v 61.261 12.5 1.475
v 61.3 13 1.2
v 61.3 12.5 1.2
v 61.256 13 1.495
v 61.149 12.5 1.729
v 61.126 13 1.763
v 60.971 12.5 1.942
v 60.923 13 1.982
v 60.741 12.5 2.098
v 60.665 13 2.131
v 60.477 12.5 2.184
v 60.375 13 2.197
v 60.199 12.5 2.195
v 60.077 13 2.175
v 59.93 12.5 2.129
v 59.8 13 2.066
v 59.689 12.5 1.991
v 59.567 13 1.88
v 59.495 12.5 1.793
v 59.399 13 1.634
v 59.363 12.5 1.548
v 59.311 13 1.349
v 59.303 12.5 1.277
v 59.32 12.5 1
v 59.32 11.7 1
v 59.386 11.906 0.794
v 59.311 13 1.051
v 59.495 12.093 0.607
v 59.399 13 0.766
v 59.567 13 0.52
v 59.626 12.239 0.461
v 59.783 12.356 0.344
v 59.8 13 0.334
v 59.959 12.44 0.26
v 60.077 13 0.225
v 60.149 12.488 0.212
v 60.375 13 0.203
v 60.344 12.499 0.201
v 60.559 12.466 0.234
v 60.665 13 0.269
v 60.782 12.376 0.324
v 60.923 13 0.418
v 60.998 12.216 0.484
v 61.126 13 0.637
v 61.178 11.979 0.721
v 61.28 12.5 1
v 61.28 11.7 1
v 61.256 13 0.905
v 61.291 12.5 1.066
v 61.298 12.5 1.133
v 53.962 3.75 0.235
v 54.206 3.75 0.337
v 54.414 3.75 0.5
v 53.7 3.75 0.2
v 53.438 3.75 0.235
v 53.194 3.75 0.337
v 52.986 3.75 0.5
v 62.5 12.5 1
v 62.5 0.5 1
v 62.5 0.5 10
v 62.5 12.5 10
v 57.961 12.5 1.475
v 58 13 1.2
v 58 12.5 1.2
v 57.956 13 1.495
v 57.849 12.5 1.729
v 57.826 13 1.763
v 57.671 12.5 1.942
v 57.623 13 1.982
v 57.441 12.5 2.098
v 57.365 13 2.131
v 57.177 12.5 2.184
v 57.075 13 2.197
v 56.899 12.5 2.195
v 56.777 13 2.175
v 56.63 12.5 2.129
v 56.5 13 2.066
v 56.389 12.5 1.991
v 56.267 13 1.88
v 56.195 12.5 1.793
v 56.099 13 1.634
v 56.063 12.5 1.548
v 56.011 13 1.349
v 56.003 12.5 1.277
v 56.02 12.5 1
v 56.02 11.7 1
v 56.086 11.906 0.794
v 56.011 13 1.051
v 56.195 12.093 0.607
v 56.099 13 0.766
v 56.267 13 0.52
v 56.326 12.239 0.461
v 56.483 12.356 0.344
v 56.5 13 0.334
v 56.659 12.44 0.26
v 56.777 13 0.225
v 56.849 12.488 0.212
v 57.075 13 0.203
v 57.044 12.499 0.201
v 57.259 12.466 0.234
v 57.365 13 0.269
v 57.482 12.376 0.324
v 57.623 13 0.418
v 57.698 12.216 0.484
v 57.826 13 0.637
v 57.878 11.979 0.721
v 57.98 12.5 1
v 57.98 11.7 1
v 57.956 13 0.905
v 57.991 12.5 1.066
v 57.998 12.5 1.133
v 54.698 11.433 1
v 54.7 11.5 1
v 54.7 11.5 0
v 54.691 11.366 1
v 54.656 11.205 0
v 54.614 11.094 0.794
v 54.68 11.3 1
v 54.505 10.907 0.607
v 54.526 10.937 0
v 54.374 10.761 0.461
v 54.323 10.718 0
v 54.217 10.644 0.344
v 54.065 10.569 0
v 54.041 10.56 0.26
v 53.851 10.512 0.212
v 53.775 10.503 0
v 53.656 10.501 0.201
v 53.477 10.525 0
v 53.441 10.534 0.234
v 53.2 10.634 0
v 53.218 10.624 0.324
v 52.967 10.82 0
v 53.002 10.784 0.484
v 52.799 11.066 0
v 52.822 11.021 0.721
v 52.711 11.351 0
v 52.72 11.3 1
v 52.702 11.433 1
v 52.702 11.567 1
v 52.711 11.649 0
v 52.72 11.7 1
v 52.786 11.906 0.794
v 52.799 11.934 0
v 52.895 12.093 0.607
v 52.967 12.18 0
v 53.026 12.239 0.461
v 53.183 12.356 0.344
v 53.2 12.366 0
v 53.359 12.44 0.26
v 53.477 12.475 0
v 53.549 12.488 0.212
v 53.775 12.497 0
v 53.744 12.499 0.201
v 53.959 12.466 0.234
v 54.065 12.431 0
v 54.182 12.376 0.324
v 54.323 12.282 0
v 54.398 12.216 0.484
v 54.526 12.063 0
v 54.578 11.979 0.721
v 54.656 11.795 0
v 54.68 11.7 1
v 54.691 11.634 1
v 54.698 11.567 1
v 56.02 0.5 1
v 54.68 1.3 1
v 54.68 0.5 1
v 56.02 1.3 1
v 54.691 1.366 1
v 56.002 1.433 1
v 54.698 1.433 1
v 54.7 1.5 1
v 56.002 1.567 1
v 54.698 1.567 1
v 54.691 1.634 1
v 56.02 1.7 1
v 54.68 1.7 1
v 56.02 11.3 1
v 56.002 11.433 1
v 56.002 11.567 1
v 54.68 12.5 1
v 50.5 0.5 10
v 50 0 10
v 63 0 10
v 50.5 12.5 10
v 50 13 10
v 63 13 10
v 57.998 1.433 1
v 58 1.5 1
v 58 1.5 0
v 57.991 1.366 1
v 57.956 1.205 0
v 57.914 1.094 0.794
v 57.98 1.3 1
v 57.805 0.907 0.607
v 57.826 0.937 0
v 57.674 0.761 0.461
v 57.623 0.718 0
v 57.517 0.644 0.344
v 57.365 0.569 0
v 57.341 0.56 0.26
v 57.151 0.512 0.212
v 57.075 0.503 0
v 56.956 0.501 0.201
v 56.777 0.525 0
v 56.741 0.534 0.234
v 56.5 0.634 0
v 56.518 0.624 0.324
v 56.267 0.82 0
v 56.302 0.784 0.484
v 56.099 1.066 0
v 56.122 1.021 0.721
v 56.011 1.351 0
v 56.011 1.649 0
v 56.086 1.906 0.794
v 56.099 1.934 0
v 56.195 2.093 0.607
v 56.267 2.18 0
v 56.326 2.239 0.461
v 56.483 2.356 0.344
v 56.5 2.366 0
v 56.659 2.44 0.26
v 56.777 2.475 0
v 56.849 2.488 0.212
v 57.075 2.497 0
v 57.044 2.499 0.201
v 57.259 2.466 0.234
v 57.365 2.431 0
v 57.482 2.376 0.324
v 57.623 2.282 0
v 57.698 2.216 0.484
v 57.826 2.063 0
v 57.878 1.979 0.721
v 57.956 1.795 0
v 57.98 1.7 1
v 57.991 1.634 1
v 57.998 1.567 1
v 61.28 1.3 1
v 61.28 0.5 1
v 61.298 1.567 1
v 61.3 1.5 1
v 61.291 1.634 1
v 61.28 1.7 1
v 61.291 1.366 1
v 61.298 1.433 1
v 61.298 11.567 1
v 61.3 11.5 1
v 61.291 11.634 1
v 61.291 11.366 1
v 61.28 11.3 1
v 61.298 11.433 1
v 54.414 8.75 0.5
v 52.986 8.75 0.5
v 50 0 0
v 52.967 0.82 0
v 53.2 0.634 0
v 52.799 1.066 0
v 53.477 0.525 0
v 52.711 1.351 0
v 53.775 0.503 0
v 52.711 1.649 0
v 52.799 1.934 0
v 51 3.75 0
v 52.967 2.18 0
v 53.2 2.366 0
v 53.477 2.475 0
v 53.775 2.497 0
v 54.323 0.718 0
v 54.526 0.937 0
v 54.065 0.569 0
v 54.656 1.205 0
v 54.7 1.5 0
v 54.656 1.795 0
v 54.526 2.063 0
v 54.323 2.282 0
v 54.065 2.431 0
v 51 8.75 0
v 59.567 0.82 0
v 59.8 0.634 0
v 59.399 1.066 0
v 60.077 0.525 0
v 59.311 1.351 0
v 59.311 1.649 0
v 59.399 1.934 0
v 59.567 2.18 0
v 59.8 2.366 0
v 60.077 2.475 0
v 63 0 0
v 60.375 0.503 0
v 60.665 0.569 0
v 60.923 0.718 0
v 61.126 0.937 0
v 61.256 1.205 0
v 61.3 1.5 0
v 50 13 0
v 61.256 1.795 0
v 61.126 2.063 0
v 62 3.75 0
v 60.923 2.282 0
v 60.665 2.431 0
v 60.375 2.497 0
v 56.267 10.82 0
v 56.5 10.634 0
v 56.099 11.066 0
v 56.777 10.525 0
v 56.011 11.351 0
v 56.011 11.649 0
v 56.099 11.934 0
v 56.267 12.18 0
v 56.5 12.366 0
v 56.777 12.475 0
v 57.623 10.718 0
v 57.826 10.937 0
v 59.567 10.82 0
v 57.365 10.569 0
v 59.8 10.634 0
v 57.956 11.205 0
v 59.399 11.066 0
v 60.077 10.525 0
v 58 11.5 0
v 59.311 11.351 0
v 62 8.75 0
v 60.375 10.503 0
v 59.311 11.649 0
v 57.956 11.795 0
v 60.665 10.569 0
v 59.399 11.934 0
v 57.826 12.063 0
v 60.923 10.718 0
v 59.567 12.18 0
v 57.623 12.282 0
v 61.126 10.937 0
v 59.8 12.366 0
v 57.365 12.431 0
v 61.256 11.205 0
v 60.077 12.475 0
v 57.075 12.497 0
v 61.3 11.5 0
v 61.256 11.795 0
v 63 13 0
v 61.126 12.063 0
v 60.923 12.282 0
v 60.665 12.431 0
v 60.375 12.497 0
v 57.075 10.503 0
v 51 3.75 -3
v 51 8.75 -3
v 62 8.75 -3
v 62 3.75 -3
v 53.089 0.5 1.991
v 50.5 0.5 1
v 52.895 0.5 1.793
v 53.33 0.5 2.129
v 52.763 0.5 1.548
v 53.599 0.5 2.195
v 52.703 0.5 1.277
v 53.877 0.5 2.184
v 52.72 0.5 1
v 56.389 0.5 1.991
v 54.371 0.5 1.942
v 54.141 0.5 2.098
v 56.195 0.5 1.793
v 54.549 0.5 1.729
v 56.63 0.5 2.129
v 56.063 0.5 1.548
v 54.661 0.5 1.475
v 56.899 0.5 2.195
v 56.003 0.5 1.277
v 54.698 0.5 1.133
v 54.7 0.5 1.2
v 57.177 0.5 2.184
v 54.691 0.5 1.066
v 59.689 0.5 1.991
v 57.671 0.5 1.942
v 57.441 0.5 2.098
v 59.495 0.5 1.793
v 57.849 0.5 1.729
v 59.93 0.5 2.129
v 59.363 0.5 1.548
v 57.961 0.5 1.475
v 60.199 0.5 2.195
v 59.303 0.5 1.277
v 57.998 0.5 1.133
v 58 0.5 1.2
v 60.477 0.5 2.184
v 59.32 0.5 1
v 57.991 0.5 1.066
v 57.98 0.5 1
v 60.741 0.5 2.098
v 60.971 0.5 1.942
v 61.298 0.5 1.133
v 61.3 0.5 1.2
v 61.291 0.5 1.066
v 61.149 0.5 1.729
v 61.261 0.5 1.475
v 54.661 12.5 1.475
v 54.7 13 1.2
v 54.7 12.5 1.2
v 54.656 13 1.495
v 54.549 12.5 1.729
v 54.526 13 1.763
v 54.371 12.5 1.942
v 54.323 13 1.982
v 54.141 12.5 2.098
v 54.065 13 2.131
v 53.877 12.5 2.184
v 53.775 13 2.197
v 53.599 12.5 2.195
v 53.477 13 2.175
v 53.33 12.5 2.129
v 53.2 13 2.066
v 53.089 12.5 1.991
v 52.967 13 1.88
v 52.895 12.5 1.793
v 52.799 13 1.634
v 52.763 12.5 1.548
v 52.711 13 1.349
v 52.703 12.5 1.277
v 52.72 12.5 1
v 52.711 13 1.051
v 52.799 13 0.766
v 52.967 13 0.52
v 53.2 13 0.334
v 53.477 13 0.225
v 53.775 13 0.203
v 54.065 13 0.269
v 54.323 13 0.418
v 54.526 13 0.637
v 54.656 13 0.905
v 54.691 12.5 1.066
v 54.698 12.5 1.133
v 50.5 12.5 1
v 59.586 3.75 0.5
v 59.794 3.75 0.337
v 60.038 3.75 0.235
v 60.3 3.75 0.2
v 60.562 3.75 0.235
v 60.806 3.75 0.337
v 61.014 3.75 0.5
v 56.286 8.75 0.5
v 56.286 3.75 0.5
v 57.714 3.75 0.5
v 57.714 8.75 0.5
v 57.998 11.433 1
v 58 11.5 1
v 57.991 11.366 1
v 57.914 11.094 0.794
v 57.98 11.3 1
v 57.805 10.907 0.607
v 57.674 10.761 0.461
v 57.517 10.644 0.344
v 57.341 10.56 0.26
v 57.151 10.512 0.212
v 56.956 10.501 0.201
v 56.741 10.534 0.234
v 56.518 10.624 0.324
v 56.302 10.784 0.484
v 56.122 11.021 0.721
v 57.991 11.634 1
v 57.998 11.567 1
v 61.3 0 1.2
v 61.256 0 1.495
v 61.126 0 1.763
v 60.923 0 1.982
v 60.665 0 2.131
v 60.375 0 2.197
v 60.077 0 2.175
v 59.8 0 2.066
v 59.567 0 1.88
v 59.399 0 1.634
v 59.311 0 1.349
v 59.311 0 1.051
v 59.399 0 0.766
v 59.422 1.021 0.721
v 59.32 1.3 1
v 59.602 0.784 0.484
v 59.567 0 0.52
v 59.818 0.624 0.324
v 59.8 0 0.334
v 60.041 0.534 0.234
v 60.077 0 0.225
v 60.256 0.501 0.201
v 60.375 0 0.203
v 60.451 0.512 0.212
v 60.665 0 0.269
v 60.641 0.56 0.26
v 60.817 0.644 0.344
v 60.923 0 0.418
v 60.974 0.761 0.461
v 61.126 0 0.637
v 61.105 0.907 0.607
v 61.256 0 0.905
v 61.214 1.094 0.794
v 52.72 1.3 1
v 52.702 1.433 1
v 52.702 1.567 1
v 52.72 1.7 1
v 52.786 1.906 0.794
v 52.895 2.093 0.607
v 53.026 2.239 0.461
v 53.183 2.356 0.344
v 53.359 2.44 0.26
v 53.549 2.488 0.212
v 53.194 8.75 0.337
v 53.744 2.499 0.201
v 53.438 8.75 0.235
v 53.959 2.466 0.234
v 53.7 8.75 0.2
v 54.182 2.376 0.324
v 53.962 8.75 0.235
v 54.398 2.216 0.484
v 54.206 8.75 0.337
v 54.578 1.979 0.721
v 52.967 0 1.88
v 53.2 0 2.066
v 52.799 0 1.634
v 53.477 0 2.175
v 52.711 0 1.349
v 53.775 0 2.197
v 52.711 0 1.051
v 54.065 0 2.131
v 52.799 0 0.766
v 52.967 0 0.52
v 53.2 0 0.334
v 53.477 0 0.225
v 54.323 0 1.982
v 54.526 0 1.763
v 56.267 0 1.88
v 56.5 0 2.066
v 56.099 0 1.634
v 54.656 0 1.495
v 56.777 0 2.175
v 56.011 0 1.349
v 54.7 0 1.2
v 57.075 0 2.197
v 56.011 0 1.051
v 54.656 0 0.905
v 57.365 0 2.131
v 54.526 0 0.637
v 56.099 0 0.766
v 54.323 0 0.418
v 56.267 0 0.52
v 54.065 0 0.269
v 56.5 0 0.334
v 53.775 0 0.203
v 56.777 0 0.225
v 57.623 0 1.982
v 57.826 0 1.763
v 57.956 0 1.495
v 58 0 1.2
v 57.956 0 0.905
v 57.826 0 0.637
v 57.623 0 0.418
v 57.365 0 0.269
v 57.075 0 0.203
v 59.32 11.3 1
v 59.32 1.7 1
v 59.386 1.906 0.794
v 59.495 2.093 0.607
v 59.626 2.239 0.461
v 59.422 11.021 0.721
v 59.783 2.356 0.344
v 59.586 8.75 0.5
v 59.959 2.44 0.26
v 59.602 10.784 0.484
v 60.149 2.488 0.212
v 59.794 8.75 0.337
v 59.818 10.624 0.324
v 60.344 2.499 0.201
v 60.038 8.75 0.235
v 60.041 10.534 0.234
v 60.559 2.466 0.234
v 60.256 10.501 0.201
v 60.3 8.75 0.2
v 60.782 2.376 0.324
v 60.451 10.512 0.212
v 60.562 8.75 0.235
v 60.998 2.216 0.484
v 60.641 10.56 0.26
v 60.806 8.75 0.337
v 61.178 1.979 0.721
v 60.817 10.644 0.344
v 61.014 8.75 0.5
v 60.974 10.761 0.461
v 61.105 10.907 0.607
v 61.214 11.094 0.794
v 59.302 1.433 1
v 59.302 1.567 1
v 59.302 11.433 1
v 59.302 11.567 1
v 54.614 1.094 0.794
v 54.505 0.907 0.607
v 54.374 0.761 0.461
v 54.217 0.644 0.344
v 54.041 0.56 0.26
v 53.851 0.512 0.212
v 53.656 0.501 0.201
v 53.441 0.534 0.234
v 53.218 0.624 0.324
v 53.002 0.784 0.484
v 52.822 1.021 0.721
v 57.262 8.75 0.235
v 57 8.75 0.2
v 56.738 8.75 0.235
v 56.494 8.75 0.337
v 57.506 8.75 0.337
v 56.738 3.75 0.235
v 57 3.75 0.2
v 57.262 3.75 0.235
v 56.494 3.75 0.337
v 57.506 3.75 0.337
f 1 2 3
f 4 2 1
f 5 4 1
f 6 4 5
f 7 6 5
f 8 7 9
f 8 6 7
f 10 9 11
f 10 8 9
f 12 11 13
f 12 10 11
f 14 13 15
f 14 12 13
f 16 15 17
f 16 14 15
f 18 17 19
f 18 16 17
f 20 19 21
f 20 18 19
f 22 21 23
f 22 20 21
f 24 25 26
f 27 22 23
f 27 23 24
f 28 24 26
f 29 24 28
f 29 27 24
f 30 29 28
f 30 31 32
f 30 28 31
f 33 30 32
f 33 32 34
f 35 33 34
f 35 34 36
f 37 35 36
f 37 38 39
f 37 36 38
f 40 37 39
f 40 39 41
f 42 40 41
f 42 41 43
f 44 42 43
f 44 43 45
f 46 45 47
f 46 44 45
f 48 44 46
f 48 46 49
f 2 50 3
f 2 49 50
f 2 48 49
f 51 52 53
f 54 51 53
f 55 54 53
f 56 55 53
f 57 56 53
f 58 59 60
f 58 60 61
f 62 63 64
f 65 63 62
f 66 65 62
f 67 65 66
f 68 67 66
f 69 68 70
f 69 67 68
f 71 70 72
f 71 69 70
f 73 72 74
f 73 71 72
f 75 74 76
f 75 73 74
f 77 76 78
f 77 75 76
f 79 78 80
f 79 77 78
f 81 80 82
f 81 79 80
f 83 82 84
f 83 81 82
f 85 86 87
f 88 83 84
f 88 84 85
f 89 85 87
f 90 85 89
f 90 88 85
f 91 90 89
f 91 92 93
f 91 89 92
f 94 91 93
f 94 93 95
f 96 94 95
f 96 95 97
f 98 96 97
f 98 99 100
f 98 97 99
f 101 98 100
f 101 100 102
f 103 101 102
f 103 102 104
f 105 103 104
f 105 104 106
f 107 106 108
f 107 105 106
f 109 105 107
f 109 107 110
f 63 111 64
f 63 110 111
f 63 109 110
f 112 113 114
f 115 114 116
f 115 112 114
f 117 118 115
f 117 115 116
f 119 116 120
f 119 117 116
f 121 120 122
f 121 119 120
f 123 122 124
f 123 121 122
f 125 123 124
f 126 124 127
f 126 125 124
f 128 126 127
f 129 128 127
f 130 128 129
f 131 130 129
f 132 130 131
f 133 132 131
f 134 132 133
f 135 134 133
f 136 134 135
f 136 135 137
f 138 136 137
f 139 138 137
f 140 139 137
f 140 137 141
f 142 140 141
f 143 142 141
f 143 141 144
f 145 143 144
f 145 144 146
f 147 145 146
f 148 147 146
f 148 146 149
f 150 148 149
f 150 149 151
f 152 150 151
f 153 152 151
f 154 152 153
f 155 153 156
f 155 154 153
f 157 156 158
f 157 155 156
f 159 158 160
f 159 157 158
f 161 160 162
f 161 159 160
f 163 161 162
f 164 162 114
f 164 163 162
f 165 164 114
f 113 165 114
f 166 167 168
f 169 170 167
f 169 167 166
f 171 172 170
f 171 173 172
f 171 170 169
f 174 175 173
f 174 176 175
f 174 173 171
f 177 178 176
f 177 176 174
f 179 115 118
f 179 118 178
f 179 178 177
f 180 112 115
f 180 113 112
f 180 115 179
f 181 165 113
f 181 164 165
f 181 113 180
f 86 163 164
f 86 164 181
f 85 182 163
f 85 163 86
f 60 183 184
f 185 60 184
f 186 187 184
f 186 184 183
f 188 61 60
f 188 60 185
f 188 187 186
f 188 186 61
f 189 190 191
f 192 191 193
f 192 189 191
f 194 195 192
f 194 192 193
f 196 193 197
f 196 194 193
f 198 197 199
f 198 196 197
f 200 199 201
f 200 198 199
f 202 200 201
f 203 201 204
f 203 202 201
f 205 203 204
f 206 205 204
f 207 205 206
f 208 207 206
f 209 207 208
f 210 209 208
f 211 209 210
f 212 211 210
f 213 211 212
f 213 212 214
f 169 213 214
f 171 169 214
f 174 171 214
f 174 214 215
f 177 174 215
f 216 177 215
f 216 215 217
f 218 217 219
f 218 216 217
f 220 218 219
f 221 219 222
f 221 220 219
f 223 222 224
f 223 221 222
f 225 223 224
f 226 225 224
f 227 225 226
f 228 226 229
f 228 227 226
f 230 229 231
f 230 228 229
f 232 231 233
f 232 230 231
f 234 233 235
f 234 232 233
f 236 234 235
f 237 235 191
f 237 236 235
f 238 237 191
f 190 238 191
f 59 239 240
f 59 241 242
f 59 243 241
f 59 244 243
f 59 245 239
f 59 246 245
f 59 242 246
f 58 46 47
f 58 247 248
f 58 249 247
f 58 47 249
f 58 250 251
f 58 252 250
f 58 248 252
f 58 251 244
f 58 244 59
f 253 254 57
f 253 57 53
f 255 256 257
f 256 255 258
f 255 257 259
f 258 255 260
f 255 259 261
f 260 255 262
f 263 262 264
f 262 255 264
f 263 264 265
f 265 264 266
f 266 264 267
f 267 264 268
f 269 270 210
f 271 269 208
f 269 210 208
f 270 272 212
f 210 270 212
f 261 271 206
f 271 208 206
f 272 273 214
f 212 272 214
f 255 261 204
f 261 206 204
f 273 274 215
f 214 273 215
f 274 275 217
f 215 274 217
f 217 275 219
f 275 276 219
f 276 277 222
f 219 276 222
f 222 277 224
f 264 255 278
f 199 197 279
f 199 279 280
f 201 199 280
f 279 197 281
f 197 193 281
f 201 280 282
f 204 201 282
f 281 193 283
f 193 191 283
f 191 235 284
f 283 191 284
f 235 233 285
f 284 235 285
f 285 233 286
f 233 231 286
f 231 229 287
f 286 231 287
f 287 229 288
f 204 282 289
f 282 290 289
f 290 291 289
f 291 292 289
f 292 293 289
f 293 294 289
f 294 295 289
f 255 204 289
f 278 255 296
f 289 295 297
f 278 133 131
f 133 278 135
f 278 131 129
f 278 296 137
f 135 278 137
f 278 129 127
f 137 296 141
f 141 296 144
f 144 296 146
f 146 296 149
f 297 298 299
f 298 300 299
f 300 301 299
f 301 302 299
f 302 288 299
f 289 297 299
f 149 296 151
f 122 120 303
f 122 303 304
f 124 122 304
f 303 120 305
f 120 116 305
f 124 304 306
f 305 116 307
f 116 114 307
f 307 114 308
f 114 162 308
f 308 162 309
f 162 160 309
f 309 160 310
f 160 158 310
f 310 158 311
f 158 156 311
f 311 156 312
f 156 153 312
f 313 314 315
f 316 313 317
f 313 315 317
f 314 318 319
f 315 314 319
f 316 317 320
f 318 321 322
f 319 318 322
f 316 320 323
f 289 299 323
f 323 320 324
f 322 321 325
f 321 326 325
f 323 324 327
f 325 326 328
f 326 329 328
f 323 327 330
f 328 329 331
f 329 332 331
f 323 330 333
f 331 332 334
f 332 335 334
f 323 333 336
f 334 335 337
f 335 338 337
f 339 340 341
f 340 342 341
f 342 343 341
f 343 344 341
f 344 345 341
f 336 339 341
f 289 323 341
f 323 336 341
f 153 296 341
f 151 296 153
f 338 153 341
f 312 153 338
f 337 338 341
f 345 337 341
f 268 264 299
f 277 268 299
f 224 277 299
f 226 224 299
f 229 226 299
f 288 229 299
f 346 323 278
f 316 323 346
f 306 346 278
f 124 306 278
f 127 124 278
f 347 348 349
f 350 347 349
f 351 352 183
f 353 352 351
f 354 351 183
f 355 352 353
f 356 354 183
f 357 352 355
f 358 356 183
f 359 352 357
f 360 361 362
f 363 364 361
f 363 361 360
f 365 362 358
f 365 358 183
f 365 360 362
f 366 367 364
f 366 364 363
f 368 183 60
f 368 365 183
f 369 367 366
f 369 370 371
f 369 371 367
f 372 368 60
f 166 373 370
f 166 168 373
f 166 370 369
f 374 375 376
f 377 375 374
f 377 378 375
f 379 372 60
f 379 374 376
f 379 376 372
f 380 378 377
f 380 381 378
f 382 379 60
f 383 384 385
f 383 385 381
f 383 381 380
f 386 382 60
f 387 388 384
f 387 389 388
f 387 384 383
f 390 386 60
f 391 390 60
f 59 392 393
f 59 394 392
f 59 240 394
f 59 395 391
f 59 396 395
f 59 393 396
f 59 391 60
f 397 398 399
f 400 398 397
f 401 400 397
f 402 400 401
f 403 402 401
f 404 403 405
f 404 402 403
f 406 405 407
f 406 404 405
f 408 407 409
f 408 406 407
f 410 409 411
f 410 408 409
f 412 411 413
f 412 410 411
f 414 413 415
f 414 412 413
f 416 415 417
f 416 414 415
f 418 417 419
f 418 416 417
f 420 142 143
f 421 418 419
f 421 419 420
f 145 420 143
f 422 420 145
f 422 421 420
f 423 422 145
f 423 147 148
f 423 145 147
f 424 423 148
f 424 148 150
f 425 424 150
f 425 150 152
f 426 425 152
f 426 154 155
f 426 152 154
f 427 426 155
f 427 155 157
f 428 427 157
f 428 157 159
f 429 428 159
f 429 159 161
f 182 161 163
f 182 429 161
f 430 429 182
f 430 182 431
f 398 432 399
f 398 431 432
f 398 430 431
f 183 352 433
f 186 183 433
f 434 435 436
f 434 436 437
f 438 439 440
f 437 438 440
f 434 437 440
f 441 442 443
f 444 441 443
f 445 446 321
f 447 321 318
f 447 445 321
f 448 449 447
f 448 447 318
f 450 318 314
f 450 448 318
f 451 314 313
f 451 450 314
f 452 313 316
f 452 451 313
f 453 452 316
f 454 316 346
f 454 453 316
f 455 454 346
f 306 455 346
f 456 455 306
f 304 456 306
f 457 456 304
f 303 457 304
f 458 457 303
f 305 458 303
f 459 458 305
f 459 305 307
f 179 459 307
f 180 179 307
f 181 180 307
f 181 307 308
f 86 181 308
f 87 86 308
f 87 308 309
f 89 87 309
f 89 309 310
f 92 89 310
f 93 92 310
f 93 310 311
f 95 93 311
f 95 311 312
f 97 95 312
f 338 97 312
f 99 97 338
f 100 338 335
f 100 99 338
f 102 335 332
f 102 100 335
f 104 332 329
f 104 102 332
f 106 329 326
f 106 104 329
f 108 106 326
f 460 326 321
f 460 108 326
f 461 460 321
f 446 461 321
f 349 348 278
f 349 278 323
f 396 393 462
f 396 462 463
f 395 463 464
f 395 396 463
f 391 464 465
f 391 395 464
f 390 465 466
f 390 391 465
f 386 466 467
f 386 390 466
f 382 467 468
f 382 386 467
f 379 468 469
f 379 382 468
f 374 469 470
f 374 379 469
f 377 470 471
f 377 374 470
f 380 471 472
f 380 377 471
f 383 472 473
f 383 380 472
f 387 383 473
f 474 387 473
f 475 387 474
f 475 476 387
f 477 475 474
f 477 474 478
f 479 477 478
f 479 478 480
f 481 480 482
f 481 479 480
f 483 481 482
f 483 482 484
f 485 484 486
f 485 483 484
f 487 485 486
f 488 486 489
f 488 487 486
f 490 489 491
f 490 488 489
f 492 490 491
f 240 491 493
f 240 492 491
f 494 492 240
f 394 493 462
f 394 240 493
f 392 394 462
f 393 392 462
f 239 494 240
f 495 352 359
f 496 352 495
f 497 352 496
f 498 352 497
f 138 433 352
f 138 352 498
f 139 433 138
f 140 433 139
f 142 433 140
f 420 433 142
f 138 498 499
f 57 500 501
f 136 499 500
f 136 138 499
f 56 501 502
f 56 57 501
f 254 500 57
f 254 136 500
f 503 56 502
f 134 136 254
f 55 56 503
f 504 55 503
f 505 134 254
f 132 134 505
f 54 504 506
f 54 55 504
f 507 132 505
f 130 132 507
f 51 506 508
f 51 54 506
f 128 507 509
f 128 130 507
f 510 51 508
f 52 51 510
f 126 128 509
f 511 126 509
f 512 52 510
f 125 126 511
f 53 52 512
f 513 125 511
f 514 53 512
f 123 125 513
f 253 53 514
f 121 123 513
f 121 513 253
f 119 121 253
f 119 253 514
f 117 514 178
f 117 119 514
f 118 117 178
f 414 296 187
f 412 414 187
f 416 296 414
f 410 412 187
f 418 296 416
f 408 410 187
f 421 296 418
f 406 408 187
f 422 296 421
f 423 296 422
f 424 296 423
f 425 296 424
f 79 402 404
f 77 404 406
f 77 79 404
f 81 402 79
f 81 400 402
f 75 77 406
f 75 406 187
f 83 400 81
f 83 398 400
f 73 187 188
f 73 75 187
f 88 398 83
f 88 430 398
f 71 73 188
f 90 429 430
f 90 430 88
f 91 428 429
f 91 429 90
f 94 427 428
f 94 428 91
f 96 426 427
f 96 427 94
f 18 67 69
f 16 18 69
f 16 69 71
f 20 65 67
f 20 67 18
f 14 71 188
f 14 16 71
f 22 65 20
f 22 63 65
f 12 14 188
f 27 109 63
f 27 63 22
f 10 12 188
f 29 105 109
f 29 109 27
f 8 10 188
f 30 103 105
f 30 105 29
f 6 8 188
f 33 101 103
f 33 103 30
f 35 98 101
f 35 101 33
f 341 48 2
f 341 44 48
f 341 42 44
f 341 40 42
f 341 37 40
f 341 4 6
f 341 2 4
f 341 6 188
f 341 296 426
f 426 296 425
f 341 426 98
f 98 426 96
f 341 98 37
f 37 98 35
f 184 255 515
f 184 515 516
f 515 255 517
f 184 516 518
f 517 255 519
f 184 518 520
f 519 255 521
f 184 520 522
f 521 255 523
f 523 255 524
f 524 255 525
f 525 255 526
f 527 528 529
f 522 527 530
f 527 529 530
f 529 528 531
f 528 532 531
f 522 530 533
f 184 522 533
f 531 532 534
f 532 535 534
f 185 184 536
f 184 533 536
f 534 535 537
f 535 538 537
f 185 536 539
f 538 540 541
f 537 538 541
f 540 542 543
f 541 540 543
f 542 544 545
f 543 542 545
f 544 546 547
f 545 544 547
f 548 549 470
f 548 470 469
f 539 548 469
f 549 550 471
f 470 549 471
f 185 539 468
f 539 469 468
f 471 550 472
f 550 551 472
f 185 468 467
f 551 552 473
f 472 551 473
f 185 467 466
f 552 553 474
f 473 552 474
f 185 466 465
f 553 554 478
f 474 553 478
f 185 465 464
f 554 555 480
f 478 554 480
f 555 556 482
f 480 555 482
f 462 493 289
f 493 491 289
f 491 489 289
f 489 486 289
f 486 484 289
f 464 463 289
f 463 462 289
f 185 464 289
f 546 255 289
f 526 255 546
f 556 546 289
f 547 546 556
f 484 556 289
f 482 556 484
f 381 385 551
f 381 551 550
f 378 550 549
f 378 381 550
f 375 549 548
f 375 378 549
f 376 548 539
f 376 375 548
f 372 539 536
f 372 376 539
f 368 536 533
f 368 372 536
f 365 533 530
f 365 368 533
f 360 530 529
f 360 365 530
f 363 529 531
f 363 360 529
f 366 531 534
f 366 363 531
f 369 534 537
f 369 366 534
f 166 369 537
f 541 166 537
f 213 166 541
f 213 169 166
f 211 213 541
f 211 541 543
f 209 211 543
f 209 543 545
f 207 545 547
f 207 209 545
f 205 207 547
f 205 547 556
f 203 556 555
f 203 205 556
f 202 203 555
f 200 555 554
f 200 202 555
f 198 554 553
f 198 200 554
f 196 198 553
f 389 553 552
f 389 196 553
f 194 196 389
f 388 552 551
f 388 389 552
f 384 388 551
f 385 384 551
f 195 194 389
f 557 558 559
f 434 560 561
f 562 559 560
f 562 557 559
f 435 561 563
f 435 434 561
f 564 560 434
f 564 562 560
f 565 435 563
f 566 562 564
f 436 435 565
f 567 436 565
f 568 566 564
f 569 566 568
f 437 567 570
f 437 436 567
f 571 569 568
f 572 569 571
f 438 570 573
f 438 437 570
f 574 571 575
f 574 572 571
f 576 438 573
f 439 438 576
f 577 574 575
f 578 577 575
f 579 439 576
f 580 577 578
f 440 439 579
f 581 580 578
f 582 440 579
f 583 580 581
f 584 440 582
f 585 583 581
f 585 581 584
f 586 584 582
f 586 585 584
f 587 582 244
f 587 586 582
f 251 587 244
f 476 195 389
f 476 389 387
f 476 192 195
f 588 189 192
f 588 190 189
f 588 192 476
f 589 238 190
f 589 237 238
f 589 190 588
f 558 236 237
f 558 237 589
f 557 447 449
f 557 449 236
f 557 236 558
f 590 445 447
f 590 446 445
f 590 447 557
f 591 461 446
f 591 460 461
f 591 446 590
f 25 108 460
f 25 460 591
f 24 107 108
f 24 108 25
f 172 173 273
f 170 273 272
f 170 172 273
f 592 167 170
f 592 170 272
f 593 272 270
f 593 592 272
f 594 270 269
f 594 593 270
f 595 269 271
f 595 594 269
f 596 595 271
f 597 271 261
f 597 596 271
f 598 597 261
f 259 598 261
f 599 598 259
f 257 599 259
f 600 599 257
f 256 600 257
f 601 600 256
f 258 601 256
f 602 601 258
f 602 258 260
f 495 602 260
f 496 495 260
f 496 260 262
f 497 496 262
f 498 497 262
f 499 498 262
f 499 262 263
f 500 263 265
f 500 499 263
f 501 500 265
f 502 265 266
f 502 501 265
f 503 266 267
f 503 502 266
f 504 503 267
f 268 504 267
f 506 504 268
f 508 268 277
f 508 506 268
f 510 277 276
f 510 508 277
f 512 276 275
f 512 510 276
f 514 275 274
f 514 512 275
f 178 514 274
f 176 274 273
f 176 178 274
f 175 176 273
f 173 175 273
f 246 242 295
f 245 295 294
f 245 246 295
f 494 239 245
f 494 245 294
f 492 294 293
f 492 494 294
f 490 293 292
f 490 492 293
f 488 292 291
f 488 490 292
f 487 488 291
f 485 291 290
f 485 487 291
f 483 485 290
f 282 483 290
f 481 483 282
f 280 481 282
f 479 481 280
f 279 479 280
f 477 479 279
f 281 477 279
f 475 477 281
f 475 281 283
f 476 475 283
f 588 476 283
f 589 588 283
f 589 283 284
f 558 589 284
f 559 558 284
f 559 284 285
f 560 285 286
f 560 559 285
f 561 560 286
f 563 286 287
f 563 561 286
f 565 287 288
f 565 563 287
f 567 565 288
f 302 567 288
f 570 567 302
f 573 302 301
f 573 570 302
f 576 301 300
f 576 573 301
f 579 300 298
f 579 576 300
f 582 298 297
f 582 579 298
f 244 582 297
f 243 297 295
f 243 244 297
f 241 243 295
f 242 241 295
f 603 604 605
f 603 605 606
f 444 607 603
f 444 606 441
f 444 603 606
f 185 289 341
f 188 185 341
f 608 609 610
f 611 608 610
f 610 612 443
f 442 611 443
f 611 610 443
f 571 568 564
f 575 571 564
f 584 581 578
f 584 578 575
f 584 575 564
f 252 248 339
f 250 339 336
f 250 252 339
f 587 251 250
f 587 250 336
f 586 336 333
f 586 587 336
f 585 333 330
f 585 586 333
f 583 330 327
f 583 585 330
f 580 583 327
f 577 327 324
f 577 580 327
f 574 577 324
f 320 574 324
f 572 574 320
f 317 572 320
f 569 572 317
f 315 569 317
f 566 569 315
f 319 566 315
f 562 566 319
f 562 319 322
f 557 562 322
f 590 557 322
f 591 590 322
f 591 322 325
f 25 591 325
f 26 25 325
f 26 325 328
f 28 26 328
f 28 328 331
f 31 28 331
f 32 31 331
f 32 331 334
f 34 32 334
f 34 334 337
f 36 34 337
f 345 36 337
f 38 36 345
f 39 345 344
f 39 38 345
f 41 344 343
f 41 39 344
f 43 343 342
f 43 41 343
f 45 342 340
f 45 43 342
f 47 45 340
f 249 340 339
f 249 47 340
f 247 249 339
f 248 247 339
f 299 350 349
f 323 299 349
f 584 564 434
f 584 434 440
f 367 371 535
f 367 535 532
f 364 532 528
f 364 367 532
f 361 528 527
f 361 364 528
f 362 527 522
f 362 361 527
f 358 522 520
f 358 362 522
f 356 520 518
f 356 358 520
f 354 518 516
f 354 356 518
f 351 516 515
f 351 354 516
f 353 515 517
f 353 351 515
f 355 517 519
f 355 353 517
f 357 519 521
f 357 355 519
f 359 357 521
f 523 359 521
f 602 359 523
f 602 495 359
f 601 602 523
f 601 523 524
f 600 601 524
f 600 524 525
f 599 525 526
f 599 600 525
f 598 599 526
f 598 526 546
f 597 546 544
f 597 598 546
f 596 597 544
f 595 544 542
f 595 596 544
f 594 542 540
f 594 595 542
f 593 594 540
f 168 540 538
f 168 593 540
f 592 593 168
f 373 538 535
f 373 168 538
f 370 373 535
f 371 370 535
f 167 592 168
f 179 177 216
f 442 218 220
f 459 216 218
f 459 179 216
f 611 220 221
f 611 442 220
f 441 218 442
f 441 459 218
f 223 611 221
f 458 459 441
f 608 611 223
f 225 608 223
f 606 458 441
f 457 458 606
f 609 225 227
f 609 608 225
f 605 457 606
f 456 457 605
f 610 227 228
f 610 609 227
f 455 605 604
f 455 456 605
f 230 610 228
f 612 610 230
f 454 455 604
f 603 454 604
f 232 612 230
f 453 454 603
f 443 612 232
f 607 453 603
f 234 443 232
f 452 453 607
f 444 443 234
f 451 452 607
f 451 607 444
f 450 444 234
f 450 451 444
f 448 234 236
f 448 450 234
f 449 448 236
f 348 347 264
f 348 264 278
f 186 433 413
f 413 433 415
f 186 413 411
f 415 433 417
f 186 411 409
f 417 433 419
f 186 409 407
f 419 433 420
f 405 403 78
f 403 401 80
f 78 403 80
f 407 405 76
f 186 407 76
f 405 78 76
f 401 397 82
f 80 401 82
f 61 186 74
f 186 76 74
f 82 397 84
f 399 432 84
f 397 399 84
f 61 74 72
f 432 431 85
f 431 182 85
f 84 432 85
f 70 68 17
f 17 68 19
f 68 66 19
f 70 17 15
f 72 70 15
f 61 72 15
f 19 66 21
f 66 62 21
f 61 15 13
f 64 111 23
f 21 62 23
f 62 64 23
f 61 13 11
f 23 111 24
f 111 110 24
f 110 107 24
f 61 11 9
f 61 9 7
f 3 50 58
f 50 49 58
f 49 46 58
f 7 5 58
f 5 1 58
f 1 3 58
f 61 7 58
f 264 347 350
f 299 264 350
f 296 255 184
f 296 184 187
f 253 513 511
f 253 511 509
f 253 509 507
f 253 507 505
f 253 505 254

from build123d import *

# Parameters (mm, degrees)
CYLINDER007_R     = 1
CYLINDER007_DEPTH = 20
CYLINDER006_R     = 1
CYLINDER006_DEPTH = 20
CYLINDER008_R     = 1
CYLINDER008_DEPTH = 20
CYLINDER004_R     = 1
CYLINDER004_DEPTH = 20
CYLINDER003_R     = 1
CYLINDER003_DEPTH = 20
CYLINDER005_R     = 1
CYLINDER005_DEPTH = 20
CYLINDER001_R     = 1
CYLINDER001_DEPTH = 20
CYLINDER_R        = 1
CYLINDER_DEPTH    = 20
CYLINDER002_R     = 1
CYLINDER002_DEPTH = 20
BOX001_W          = 12
BOX001_H          = 12
BOX001_DEPTH      = 9
BOX_W             = 13
BOX_H             = 13
BOX_DEPTH         = 10
BOX002_W          = 11
BOX002_H          = 5
BOX002_DEPTH      = 3.5


with BuildPart() as cilindro007:
    # Cylinder007 → Cylinder007 (new body)
    with BuildSketch(Plane(origin=(3.7, 17, 1.2), x_dir=(1, 0, 0), z_dir=(0, -1, 0))):
        Circle(CYLINDER007_R)
    extrude(amount=CYLINDER007_DEPTH)


with BuildPart() as cilindro006:
    # Cylinder006 → Cylinder006 (new body)
    with BuildSketch(Plane(origin=(10.3, 17.7, 1.2), x_dir=(1, 0, 0), z_dir=(0, -1, 0))):
        Circle(CYLINDER006_R)
    extrude(amount=CYLINDER006_DEPTH)


with BuildPart() as cilindro008:
    # Cylinder008 → Cylinder008 (new body)
    with BuildSketch(Plane(origin=(7, 17.7, 1.2), x_dir=(1, 0, 0), z_dir=(0, -1, 0))):
        Circle(CYLINDER008_R)
    extrude(amount=CYLINDER008_DEPTH)


with BuildPart() as cilindro004:
    # Cylinder004 → Cylinder004 (new body)
    with BuildSketch(Plane(origin=(3.7, 1.5, 12), x_dir=(1, 0, 0), z_dir=(0, 0, -1))):
        Circle(CYLINDER004_R)
    extrude(amount=CYLINDER004_DEPTH)


with BuildPart() as cilindro003:
    # Cylinder003 → Cylinder003 (new body)
    with BuildSketch(Plane(origin=(10.3, 1.5, 12), x_dir=(1, 0, 0), z_dir=(0, 0, -1))):
        Circle(CYLINDER003_R)
    extrude(amount=CYLINDER003_DEPTH)


with BuildPart() as cilindro005:
    # Cylinder005 → Cylinder005 (new body)
    with BuildSketch(Plane(origin=(7, 1.5, 12), x_dir=(1, 0, 0), z_dir=(0, 0, -1))):
        Circle(CYLINDER005_R)
    extrude(amount=CYLINDER005_DEPTH)


with BuildPart() as cilindro001:
    # Cylinder001 → Cylinder001 (new body)
    with BuildSketch(Plane(origin=(7, 11.5, 12.2), x_dir=(1, 0, 0), z_dir=(0, 0, -1))):
        Circle(CYLINDER001_R)
    extrude(amount=CYLINDER001_DEPTH)


with BuildPart() as cilindro:
    # Cylinder → Cylinder (new body)
    with BuildSketch(Plane(origin=(3.7, 11.5, 12), x_dir=(1, 0, 0), z_dir=(0, 0, -1))):
        Circle(CYLINDER_R)
    extrude(amount=CYLINDER_DEPTH)


with BuildPart() as cilindro002:
    # Cylinder002 → Cylinder002 (new body)
    with BuildSketch(Plane(origin=(10.3, 11.5, 12), x_dir=(1, 0, 0), z_dir=(0, 0, -1))):
        Circle(CYLINDER002_R)
    extrude(amount=CYLINDER002_DEPTH)


with BuildPart() as cubo001:
    # Box001 → Box001 (new body)
    with BuildSketch(Plane(origin=(0.5, 0.5, 1), x_dir=(1, 0, 0), z_dir=(0, 0, 1))):
        with Locations((6, 6)):
            Rectangle(BOX001_W, BOX001_H)
    extrude(amount=BOX001_DEPTH)


with BuildPart() as cut009:
    # Box → Box (new body)
    with BuildSketch(Plane.XY):
        with Locations((6.5, 6.5)):
            Rectangle(BOX_W, BOX_H)
    extrude(amount=BOX_DEPTH)

    # Cut: cut Cubo001
    add(cubo001.part, mode=Mode.SUBTRACT)

    # Cut001: cut Cilindro002
    add(cilindro002.part, mode=Mode.SUBTRACT)

    # Cut002: cut Cilindro
    add(cilindro.part, mode=Mode.SUBTRACT)

    # Cut003: cut Cilindro001
    add(cilindro001.part, mode=Mode.SUBTRACT)

    # Cut004: cut Cilindro005
    add(cilindro005.part, mode=Mode.SUBTRACT)

    # Cut005: cut Cilindro003
    add(cilindro003.part, mode=Mode.SUBTRACT)

    # Cut006: cut Cilindro004
    add(cilindro004.part, mode=Mode.SUBTRACT)

    # Cut007: cut Cilindro008
    add(cilindro008.part, mode=Mode.SUBTRACT)

    # Cut008: cut Cilindro006
    add(cilindro006.part, mode=Mode.SUBTRACT)

    # Cut009: cut Cilindro007
    add(cilindro007.part, mode=Mode.SUBTRACT)


with BuildPart() as normal:
    # Box002 → Box002 (new body)
    with BuildSketch(Plane(origin=(1, 3.75, -3), x_dir=(1, 0, 0), z_dir=(0, 0, 1))):
        with Locations((5.5, 2.5)):
            Rectangle(BOX002_W, BOX002_H)
    extrude(amount=BOX002_DEPTH)

    # Fusion: union Cut009
    add(cut009.part)


with BuildPart() as normal_1:
    # Fusion placement: moved
    add(normal.part.moved(Location((50, 0, 0))))


solid = normal_1.part
